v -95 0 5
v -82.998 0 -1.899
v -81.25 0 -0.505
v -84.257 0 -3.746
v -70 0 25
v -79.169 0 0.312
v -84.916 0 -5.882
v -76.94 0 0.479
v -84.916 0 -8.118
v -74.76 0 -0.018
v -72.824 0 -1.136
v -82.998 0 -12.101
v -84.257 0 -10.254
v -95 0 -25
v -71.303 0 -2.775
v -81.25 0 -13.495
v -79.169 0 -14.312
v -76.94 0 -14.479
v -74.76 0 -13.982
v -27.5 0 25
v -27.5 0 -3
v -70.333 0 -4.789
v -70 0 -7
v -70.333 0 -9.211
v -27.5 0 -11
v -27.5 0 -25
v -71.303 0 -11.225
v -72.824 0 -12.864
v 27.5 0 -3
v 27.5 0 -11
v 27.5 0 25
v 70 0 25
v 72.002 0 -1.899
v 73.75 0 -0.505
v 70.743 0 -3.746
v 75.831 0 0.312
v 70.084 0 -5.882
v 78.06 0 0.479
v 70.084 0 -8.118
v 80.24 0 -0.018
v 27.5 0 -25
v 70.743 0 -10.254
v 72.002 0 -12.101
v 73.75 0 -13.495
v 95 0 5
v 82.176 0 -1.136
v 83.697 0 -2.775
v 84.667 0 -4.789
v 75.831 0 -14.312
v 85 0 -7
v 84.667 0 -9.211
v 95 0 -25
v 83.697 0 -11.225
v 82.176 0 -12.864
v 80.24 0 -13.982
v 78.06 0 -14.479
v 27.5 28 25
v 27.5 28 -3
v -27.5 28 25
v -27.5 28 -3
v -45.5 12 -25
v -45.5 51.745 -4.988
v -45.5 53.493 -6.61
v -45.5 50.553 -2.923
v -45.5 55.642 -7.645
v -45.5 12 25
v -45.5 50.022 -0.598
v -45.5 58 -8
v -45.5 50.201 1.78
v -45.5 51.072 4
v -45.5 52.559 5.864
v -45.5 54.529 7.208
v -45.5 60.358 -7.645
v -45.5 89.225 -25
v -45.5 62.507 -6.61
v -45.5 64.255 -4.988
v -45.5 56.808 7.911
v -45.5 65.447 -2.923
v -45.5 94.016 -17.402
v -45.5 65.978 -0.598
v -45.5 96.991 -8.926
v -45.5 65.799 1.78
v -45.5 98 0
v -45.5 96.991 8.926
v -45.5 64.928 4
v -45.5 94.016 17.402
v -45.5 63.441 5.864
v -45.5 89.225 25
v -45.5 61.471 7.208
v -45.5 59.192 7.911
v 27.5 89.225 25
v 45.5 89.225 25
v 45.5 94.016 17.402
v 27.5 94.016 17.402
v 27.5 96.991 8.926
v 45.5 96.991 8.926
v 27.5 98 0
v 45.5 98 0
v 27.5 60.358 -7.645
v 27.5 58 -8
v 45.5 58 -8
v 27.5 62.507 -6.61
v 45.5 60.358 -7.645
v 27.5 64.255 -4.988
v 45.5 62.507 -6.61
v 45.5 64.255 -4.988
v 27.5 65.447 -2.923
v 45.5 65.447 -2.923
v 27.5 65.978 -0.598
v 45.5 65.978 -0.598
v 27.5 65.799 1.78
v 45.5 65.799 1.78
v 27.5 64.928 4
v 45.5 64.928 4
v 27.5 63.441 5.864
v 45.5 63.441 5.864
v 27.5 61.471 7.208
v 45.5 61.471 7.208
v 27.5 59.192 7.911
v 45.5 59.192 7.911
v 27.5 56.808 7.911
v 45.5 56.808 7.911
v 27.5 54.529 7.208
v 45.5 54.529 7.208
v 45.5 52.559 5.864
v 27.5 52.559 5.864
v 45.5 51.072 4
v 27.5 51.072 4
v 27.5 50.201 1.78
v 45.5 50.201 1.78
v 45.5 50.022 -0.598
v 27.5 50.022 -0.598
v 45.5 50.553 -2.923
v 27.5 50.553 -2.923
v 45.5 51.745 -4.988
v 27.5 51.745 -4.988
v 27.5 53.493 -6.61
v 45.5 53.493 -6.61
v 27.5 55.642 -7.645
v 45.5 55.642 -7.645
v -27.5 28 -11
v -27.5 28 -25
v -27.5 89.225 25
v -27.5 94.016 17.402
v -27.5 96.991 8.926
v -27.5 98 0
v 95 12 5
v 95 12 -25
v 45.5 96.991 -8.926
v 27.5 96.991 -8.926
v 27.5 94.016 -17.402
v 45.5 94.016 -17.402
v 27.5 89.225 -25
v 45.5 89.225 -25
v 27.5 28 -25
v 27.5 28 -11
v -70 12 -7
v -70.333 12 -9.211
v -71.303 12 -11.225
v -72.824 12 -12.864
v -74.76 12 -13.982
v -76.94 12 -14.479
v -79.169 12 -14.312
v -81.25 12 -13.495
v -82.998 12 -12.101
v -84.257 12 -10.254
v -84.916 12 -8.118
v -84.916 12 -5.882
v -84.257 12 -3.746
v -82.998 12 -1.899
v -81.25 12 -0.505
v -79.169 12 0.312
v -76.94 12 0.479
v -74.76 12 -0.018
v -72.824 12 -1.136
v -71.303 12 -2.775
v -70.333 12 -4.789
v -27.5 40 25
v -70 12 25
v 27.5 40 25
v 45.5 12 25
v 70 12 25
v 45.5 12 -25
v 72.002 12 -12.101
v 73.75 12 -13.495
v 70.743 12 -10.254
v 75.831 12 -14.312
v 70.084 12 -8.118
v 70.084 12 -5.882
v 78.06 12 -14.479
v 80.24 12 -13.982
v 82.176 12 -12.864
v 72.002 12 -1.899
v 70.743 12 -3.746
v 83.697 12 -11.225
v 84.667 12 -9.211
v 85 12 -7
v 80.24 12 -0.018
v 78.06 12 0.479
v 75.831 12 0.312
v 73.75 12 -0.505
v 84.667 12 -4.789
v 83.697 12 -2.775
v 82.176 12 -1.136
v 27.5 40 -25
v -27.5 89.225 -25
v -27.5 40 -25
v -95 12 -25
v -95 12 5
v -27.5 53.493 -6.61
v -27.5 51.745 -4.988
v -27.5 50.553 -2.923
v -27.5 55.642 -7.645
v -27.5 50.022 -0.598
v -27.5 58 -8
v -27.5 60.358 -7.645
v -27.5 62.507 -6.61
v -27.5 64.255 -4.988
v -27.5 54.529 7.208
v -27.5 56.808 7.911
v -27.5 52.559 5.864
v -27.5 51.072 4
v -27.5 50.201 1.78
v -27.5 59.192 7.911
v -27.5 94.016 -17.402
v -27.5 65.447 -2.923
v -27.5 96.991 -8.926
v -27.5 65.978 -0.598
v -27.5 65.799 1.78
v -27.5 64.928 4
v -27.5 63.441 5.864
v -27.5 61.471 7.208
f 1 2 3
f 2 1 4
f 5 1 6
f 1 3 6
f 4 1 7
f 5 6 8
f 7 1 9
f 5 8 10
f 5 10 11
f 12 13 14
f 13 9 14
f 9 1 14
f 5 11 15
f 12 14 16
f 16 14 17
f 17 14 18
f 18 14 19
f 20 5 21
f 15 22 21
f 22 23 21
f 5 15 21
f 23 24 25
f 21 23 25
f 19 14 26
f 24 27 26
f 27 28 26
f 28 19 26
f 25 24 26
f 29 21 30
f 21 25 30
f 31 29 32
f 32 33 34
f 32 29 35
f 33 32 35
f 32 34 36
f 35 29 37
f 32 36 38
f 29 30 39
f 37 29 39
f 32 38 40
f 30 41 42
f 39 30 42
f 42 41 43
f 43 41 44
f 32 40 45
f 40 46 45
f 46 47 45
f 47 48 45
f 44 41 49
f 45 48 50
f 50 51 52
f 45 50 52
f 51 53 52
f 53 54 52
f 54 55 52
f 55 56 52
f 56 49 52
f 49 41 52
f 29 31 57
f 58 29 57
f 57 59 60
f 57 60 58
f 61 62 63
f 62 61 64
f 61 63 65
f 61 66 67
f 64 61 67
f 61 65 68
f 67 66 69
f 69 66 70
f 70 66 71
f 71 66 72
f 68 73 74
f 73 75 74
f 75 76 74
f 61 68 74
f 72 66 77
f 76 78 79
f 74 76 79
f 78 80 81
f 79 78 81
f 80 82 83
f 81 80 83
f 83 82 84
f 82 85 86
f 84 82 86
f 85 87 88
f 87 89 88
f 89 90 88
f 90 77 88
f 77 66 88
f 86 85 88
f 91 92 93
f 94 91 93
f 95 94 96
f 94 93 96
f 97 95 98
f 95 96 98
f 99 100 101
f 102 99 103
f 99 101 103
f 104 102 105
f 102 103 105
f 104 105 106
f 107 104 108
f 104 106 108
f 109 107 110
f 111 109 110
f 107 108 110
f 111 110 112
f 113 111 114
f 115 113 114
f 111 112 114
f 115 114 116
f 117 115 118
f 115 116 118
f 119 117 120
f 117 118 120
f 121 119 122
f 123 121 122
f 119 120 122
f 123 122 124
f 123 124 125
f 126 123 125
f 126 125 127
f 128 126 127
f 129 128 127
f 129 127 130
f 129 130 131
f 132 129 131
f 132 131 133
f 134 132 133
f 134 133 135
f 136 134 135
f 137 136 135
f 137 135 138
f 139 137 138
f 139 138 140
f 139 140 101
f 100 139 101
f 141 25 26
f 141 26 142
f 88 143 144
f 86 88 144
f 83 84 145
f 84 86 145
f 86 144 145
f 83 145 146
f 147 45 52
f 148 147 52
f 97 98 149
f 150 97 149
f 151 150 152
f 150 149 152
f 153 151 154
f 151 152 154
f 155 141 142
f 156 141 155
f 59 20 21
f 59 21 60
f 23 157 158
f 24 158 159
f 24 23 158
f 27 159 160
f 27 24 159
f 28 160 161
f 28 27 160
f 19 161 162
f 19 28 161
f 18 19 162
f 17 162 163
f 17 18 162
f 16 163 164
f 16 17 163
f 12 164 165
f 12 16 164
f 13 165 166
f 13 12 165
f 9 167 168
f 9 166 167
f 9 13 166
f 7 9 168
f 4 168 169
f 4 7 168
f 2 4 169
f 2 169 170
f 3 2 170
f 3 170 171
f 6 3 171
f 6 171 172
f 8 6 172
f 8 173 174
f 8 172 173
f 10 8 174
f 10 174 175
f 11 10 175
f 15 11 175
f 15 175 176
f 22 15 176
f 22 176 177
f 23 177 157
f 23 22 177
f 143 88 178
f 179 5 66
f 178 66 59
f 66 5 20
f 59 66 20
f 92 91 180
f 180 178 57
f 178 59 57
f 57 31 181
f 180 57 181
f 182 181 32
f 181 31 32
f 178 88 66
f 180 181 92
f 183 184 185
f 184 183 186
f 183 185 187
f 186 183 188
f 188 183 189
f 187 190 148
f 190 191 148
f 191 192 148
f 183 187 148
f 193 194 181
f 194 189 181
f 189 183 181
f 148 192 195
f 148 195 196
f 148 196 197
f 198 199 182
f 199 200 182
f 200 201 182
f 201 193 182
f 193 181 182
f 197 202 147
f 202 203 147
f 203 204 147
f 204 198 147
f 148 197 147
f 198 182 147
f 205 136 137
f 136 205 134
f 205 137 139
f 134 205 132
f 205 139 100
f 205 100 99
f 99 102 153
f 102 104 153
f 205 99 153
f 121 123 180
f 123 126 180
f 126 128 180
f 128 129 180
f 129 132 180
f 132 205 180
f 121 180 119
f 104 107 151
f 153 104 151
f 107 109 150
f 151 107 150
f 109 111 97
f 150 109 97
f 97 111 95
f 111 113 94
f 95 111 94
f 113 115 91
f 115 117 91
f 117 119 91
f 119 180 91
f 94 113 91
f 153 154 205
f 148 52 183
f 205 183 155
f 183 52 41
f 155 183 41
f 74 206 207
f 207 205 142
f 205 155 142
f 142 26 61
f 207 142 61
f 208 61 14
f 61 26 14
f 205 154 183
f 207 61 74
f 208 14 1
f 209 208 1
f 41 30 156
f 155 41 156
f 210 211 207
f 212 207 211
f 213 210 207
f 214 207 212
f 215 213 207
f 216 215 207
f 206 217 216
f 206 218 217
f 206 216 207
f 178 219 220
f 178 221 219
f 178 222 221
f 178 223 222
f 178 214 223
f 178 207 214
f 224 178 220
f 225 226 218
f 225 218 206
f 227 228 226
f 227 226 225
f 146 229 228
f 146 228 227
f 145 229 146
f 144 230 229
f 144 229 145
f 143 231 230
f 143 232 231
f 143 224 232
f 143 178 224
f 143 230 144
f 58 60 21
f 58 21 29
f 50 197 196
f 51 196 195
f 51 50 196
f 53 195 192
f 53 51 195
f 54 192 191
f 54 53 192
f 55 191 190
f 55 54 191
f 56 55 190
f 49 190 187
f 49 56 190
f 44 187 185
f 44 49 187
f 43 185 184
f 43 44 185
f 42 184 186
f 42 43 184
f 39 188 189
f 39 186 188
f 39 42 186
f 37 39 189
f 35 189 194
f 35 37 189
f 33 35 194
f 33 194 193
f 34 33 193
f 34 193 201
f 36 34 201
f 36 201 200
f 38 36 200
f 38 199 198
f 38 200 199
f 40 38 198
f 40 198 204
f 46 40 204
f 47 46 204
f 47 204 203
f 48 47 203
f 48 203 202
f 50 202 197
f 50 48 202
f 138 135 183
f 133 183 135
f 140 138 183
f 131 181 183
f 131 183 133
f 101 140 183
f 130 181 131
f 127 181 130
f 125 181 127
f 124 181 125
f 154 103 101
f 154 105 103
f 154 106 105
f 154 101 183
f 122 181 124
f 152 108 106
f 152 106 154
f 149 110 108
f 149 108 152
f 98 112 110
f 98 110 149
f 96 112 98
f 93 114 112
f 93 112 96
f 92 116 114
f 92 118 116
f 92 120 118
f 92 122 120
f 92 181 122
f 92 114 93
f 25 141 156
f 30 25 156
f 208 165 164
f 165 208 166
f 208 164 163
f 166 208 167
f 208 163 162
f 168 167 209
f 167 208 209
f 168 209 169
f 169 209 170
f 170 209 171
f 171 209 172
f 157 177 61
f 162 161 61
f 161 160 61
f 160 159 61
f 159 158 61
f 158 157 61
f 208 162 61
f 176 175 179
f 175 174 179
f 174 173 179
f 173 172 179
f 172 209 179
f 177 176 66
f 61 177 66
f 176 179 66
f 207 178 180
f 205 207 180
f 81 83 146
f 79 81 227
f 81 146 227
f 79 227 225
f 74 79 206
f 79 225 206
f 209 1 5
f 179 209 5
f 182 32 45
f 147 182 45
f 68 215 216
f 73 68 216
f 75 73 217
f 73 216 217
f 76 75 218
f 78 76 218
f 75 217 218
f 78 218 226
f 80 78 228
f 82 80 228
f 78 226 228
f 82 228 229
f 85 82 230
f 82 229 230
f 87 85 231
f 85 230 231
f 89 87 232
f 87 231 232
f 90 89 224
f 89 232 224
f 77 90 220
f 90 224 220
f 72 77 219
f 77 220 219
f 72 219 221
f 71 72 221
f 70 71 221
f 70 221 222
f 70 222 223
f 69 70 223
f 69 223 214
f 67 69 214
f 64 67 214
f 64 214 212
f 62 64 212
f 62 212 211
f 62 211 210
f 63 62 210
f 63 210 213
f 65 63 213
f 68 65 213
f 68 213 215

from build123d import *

# Parameters (mm, degrees)
SKETCH1_R           = 7.5
BOSS_EXTRUDE1_DEPTH = 98
SKETCH2_W           = 49.5
SKETCH2_H           = 86
SKETCH2_W_2         = 55
SKETCH2_H_2         = 58
CUT_EXTRUDE1_DEPTH  = 51
SKETCH3_W           = 55
SKETCH3_H           = 28
CUT_EXTRUDE2_DEPTH  = 51
SKETCH4_W           = 55
SKETCH4_H           = 8
BOSS_EXTRUDE2_DEPTH = 28
SKETCH5_R           = 8
CUT_EXTRUDE3_DEPTH  = 141.5


with BuildPart() as part:
    # Sketch1 → Boss-Extrude1 (new body)
    with BuildSketch(Plane(origin=(0, 0, 0), x_dir=(1, 0, 0), z_dir=(0, 1, 0))):
        Polygon((-95, 25), (-95, -5), (-70, -25), (70, -25), (95, -5), (95, 25), align=None)
        with Locations((-77.5, 7)):
            Circle(SKETCH1_R, mode=Mode.SUBTRACT)
        with Locations((77.5, 7)):
            Circle(SKETCH1_R, mode=Mode.SUBTRACT)
    extrude(amount=BOSS_EXTRUDE1_DEPTH)

    # Sketch2 → Cut-Extrude1 (cut, through all)
    with BuildSketch(Plane.XY.offset(25)):
        with Locations((-70.25, 55)):
            Rectangle(SKETCH2_W, SKETCH2_H)
        with Locations((70.25, 55)):
            Rectangle(SKETCH2_W, SKETCH2_H)
        with Locations((0, 69)):
            Rectangle(SKETCH2_W_2, SKETCH2_H_2)
    extrude(amount=-CUT_EXTRUDE1_DEPTH, mode=Mode.SUBTRACT)

    # Sketch3 → Cut-Extrude2 (cut, through all)
    with BuildSketch(Plane.XY.offset(25)):
        with Locations((0, 14)):
            Rectangle(SKETCH3_W, SKETCH3_H)
    extrude(amount=-CUT_EXTRUDE2_DEPTH, mode=Mode.SUBTRACT)

    # Sketch4 → Boss-Extrude2 (add)
    with BuildSketch(Plane.XZ.offset(-28)):
        with Locations((0, -7)):
            Rectangle(SKETCH4_W, SKETCH4_H)
    extrude(amount=BOSS_EXTRUDE2_DEPTH)

    # Sketch5 → Cut-Extrude3 (cut, through all)
    with BuildSketch(Plane(origin=(45.5, 0, 0), x_dir=(0, 0, -1), z_dir=(1, 0, 0))):
        with BuildLine():
            ThreePointArc((2.26e-07, 98), (13.247648961, 95.742546244), (25, 89.224989992))
            Line((25, 89.224989992), (25, 98))
            Line((25, 98), (2.26e-07, 98))
        make_face()
        with BuildLine():
            ThreePointArc((-25, 89.224989992), (-13.247648747, 95.742546319), (2.26e-07, 98))
            Line((2.26e-07, 98), (-25, 98))
            Line((-25, 98), (-25, 89.224989992))
        make_face()
        with Locations((0, 58)):
            Circle(SKETCH5_R)
    extrude(amount=-CUT_EXTRUDE3_DEPTH, mode=Mode.SUBTRACT)


solid = part.part
